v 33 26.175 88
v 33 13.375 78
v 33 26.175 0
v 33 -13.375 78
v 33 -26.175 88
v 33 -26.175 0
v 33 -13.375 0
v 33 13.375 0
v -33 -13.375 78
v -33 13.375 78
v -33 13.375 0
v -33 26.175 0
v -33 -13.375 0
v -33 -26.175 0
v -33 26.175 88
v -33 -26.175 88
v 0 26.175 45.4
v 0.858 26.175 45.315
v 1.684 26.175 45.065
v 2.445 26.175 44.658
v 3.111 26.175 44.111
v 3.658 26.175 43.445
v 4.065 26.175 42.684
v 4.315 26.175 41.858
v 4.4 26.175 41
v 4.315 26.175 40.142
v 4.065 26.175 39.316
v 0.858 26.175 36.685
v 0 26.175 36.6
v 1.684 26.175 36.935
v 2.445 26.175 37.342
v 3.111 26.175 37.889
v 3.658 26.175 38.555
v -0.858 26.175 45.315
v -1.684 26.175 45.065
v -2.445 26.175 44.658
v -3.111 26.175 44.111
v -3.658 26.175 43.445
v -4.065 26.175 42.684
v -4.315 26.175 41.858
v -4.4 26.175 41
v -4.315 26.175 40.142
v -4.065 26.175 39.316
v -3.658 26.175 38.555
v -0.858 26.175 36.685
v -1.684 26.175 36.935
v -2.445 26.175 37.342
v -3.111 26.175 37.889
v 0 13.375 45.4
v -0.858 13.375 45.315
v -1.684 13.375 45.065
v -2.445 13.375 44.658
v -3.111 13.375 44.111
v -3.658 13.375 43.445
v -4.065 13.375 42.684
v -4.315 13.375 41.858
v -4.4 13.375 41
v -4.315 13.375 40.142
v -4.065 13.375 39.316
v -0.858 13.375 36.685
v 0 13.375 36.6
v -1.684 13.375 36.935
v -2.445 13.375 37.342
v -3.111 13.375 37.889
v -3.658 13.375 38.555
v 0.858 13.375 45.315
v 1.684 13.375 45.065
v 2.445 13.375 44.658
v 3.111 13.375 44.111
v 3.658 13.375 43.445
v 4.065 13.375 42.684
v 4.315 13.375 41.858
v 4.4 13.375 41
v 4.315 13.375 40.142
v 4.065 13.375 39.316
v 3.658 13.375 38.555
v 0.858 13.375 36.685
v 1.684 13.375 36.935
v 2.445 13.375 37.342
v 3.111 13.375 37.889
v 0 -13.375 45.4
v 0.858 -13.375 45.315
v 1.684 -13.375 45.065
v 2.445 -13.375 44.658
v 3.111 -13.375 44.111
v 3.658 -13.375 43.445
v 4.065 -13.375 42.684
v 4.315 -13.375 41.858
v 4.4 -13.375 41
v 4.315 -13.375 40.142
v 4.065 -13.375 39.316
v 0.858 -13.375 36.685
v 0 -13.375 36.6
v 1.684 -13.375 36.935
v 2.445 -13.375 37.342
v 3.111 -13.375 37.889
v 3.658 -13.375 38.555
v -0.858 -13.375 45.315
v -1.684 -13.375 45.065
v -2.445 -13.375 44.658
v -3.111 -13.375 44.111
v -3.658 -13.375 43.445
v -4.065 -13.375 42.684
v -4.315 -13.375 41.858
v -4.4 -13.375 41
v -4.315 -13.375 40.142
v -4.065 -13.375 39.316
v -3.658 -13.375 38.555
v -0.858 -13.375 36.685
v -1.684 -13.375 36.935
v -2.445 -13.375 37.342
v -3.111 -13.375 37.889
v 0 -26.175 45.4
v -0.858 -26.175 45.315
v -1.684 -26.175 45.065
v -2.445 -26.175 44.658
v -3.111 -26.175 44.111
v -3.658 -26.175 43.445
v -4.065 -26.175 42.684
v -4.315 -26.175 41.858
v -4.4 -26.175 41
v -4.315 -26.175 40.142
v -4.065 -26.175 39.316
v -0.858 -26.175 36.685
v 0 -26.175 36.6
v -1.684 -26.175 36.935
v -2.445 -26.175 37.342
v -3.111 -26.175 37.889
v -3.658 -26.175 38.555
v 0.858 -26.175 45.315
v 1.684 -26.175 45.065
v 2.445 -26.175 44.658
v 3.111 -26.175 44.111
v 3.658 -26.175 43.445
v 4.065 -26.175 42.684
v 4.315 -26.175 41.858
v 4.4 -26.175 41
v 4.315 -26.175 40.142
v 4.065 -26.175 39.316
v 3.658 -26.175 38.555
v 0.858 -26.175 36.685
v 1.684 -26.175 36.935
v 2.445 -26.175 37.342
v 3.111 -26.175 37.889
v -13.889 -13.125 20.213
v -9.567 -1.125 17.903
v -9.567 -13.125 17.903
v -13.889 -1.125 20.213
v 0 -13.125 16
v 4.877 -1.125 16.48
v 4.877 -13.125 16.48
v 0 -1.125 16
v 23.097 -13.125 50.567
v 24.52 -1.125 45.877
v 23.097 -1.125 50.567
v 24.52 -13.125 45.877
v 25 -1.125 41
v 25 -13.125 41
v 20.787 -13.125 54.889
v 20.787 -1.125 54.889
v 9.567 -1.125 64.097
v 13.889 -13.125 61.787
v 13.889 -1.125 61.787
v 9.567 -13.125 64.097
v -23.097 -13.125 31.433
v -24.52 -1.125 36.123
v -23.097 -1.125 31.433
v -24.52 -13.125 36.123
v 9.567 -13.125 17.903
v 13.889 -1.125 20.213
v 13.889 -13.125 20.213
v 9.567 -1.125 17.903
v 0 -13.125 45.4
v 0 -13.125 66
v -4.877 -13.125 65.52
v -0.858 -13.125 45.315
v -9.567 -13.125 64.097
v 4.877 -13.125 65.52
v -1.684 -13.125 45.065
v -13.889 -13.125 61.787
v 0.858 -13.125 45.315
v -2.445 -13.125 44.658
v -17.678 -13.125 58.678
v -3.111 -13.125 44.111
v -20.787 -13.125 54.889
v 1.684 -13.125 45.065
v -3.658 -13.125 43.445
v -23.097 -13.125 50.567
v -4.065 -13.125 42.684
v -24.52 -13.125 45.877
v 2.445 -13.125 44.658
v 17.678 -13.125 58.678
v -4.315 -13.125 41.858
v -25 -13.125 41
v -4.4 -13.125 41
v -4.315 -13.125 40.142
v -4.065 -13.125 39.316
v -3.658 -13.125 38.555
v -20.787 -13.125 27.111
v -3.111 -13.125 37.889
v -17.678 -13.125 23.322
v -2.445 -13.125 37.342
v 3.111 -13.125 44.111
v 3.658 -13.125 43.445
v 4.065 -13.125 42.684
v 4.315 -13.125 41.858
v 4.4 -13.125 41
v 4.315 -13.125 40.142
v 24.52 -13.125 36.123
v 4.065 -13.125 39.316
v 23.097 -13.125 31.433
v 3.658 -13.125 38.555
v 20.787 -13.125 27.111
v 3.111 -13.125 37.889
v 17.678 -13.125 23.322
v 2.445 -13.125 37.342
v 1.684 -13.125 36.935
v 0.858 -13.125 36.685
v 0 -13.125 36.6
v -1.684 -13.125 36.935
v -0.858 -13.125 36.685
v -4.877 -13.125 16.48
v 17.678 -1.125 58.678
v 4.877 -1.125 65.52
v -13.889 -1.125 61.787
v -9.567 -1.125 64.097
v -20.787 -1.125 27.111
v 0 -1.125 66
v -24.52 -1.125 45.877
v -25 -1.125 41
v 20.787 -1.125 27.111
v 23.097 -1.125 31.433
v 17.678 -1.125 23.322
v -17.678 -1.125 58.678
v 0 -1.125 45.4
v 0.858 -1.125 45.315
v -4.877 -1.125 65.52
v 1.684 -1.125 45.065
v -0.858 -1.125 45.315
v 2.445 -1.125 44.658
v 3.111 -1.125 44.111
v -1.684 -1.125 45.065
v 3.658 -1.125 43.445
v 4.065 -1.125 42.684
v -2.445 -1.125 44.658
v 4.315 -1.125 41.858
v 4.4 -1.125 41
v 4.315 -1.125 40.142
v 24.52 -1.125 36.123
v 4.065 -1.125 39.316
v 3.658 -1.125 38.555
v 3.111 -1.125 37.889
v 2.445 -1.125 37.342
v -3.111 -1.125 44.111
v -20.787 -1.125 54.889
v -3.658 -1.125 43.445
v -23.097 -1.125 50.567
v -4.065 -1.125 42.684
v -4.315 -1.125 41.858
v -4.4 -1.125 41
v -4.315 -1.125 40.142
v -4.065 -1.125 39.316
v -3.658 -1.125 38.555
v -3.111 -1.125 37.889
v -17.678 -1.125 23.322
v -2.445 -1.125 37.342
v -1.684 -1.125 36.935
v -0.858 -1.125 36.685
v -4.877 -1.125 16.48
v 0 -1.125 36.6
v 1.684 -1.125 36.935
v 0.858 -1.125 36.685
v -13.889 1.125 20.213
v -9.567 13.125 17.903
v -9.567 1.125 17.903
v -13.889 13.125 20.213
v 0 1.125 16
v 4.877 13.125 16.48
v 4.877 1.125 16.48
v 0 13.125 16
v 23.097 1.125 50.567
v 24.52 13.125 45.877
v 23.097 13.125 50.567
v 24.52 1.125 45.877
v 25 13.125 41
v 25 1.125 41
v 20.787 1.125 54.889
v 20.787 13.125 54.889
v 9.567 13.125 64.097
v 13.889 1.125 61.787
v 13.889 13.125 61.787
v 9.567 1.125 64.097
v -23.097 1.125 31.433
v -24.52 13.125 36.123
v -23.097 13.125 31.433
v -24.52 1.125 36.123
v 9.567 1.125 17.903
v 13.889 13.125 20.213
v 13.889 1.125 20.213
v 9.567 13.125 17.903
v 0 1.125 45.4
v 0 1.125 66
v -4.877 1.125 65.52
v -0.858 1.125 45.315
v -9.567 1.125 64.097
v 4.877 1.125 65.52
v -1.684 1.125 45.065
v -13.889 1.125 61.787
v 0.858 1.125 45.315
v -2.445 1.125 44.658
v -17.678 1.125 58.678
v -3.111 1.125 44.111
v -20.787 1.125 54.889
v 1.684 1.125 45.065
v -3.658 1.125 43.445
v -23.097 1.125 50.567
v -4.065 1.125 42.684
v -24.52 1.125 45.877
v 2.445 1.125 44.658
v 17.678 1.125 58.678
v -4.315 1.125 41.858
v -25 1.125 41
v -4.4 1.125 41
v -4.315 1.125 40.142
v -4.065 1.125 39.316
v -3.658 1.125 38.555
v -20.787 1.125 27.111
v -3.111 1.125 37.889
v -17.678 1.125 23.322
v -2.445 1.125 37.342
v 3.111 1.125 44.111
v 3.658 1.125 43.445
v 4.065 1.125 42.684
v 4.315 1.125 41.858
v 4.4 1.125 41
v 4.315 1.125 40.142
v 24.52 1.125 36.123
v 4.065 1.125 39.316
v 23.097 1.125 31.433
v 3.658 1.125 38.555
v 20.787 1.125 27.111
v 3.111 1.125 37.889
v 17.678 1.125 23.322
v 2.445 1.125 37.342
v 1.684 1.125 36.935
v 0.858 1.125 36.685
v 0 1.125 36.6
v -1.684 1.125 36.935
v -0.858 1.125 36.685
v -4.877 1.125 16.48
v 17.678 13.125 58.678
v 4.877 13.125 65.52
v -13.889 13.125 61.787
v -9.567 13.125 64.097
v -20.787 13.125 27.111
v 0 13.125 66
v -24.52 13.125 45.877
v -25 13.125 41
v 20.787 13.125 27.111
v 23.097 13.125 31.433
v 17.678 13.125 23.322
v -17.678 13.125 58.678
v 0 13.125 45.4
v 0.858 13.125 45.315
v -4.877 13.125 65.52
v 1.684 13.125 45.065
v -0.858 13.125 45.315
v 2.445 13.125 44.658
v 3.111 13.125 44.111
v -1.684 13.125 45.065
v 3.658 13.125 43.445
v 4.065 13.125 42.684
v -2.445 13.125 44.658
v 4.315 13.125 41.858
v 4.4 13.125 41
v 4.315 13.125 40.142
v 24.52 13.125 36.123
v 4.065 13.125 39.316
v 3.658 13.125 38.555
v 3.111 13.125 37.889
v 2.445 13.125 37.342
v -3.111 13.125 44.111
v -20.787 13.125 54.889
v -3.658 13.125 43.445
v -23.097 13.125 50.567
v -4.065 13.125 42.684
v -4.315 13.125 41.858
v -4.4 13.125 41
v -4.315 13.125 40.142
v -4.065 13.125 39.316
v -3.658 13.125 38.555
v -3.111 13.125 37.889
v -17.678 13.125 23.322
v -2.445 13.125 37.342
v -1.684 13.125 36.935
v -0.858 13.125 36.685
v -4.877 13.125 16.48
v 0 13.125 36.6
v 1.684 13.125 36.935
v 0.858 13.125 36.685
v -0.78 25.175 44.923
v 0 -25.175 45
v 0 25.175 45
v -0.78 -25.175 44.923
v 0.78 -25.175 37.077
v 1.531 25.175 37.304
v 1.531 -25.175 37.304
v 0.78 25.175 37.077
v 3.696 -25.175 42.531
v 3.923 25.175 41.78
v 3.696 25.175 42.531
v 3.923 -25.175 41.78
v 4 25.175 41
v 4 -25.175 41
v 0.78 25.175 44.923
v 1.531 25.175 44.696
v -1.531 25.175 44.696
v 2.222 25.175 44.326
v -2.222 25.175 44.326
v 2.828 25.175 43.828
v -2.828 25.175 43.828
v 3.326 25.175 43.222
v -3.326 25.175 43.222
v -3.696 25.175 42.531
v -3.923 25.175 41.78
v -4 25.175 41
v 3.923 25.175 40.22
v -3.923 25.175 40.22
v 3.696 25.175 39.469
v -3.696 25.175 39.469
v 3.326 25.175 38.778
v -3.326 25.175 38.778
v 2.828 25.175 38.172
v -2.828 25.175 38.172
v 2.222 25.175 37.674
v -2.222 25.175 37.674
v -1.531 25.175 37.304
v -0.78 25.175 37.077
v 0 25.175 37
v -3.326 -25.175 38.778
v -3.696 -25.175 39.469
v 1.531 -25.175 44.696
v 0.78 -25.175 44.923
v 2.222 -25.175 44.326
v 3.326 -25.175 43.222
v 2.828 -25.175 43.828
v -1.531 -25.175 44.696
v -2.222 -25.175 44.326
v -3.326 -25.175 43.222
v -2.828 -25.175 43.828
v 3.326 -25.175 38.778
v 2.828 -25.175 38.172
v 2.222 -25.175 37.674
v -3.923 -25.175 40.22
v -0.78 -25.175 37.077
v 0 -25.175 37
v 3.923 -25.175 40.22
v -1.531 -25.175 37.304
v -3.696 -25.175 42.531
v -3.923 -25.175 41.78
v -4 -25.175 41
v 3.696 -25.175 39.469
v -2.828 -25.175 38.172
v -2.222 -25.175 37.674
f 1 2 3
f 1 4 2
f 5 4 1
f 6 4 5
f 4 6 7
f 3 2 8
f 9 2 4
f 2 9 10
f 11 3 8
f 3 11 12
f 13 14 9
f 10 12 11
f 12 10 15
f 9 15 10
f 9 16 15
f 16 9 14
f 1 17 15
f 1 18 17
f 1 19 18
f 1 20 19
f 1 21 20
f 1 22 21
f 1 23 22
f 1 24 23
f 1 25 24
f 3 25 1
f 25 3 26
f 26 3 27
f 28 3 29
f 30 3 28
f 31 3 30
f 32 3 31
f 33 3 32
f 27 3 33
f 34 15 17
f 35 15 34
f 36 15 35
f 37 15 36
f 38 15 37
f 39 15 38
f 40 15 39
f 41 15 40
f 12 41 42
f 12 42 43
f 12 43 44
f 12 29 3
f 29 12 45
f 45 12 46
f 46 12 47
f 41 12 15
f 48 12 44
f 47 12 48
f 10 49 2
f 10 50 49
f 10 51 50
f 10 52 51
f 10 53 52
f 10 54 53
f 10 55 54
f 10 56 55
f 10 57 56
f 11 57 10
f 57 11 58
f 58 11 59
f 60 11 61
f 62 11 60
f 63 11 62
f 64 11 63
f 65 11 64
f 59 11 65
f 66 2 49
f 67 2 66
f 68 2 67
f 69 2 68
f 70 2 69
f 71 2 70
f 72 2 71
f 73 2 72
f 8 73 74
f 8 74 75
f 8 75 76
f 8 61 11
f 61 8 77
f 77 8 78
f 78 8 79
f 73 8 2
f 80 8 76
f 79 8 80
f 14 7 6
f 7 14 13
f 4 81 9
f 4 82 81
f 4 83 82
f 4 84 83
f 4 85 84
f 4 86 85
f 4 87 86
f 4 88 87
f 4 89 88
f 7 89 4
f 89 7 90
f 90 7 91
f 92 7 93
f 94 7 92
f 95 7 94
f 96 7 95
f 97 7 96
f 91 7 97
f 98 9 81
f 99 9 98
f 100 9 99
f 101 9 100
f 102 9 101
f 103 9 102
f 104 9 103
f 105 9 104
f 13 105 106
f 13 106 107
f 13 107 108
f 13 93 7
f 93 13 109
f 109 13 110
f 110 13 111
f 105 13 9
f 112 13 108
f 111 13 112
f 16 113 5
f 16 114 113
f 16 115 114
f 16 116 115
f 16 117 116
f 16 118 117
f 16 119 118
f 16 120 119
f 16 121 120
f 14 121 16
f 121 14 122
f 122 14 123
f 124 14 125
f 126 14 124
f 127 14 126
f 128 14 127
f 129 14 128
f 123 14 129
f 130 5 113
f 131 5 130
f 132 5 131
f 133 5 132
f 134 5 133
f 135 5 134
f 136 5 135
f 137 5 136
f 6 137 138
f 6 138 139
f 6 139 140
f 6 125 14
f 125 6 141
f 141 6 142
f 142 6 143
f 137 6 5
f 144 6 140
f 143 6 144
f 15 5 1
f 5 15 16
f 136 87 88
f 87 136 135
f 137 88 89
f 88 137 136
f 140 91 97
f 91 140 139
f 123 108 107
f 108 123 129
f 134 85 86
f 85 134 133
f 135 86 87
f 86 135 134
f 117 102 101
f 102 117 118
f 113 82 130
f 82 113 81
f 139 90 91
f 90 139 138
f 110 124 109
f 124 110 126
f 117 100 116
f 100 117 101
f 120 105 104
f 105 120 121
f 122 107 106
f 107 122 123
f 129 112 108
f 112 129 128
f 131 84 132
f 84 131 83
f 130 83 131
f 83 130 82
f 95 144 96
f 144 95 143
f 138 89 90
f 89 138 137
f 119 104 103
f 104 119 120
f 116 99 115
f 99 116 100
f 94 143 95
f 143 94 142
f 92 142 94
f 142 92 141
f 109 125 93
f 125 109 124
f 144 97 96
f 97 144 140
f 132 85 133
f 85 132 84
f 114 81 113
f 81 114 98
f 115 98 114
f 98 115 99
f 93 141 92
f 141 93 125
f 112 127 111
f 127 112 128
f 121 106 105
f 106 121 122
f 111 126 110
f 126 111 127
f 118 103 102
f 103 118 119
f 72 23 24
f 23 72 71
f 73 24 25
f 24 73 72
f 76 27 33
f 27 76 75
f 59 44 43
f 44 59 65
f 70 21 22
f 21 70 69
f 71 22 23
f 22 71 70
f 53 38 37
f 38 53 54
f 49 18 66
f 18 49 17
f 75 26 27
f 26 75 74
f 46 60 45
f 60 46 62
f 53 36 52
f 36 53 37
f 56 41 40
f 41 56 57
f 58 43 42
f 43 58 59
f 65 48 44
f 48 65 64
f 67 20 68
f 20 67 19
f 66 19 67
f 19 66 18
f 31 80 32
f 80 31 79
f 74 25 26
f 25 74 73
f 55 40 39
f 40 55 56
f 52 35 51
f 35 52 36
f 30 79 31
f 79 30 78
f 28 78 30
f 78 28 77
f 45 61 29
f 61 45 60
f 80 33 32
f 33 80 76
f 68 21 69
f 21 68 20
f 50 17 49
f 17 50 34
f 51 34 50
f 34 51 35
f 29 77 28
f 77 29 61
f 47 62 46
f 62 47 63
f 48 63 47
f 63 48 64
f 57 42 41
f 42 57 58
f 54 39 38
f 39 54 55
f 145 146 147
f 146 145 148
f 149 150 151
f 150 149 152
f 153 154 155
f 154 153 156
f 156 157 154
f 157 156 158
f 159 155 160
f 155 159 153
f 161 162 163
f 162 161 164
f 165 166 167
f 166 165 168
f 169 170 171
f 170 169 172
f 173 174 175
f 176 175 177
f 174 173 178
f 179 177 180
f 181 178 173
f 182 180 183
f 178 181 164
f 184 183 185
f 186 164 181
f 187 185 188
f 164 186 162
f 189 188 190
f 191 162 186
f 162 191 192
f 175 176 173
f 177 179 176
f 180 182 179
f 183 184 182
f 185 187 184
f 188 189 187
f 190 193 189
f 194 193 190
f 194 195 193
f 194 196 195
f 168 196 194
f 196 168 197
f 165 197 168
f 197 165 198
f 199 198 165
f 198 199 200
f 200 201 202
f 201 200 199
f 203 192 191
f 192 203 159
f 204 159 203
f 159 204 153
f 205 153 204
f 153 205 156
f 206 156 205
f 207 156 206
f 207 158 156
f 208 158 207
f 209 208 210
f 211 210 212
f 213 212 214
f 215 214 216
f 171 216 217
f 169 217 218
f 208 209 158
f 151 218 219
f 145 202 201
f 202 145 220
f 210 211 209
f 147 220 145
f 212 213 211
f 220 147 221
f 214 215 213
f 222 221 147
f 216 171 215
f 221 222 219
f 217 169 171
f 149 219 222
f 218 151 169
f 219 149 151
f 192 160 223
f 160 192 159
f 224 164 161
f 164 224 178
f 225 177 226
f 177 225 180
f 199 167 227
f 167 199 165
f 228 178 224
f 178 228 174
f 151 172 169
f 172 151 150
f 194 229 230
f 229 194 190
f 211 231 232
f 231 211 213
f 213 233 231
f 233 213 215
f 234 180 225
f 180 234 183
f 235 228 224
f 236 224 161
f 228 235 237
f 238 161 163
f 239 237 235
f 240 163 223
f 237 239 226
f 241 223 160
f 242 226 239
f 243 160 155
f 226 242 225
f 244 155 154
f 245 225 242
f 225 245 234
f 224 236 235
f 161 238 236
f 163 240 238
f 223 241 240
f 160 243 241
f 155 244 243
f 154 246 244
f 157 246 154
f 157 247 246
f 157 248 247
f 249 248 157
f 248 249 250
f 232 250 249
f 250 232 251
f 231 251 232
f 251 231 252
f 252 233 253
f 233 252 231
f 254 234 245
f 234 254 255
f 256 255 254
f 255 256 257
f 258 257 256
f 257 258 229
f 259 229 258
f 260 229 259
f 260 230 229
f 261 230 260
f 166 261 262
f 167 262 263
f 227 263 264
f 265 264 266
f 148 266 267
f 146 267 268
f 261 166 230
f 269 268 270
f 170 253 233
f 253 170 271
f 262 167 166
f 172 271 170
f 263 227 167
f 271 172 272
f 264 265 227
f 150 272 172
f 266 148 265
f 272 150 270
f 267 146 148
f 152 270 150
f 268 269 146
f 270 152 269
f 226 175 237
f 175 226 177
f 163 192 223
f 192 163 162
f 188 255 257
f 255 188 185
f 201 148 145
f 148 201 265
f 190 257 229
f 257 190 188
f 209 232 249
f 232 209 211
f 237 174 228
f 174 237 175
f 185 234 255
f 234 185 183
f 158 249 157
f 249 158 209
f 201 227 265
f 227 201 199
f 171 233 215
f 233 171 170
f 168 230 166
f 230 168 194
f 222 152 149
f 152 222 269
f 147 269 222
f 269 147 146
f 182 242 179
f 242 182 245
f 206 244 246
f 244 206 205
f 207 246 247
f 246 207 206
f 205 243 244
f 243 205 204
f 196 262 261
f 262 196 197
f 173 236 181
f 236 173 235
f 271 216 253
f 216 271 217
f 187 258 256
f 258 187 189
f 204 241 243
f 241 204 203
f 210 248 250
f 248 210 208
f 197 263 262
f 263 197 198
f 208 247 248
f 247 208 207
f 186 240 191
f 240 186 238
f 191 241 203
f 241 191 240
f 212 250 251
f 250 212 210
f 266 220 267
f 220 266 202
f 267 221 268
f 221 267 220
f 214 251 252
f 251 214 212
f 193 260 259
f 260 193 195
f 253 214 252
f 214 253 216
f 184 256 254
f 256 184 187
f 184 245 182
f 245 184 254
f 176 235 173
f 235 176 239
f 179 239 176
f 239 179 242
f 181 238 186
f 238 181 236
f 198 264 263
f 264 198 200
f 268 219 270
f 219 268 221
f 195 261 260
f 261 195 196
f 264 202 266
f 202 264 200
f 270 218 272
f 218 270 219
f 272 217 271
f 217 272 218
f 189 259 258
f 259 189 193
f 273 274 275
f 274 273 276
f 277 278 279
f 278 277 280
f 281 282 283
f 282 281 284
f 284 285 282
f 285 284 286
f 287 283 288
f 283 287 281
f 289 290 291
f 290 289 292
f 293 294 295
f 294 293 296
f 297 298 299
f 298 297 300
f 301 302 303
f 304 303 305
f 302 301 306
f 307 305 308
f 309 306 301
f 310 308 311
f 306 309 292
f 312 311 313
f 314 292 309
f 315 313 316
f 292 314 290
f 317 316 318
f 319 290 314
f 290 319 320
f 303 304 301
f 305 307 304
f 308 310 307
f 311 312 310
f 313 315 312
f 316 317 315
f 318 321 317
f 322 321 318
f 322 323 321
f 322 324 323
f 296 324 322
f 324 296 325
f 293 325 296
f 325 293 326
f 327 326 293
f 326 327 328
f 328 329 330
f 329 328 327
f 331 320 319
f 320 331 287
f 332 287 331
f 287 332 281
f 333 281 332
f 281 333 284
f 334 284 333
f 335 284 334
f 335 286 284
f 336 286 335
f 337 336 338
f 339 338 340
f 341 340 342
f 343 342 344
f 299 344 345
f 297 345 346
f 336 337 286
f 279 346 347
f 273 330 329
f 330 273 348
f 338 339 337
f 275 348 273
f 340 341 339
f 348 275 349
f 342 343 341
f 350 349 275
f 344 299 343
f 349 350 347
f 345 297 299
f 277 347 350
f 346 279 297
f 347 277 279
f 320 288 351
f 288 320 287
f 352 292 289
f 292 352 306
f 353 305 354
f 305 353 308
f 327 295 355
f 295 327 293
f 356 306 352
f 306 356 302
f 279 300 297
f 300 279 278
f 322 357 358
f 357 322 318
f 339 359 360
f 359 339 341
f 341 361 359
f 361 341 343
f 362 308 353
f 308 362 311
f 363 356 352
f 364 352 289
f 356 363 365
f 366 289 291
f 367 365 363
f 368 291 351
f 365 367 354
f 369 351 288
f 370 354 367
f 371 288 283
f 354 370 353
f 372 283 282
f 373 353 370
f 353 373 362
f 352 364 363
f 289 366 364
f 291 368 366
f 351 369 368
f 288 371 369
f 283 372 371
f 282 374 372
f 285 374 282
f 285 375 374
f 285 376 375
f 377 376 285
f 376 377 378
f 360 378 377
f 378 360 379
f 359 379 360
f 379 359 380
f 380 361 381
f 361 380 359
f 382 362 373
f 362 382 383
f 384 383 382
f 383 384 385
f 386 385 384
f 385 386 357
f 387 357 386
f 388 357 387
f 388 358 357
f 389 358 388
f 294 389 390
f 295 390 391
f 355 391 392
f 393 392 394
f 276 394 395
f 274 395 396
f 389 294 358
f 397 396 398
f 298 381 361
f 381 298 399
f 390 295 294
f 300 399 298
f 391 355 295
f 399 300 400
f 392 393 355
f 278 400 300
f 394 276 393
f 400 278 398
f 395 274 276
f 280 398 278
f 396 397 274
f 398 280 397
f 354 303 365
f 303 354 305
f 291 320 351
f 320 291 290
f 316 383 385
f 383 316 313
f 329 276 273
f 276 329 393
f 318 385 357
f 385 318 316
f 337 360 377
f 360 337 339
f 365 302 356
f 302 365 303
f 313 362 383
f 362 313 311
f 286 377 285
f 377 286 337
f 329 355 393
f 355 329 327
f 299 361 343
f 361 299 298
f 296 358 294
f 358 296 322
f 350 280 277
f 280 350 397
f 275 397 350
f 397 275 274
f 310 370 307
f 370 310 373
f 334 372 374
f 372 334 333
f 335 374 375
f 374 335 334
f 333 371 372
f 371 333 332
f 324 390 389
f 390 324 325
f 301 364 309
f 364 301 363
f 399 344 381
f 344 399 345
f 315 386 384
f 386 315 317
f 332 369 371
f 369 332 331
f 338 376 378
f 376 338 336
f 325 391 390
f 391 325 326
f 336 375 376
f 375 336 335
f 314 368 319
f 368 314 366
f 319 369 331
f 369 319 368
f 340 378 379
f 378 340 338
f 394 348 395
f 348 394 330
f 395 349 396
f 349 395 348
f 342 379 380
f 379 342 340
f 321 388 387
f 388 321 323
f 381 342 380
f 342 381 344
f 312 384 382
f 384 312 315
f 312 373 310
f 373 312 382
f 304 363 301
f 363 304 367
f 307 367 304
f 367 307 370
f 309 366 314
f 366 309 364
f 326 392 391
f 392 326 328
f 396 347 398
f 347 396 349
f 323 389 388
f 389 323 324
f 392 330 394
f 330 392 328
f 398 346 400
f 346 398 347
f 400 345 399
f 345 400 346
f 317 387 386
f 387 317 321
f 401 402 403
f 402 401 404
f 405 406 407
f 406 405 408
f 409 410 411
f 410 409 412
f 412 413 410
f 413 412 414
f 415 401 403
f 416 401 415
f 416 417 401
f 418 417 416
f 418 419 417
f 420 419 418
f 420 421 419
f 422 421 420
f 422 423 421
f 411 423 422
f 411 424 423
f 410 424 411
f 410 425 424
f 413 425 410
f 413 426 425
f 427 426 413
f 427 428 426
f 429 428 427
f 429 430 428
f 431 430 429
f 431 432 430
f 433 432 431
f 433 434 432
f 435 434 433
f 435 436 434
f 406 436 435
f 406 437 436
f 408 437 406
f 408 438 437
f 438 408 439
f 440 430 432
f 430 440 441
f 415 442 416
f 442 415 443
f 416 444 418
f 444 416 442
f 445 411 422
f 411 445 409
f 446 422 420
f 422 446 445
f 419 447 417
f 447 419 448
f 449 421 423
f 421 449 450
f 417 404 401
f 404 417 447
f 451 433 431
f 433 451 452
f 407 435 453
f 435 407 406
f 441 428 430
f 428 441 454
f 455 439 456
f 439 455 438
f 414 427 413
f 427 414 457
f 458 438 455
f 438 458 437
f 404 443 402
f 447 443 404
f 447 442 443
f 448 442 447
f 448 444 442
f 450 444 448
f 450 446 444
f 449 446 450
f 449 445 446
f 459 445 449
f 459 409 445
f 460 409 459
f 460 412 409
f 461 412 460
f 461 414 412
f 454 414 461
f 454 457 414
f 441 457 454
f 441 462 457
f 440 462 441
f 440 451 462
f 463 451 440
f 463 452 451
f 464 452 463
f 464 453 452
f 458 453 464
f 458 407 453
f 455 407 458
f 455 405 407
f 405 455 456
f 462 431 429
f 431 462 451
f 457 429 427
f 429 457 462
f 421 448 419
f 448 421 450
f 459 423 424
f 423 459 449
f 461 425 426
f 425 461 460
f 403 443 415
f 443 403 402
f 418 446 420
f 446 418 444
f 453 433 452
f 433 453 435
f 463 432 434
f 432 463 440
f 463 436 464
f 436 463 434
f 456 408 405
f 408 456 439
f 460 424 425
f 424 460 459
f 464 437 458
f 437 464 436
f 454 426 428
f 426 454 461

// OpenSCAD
$fn = 32;

// ------------------------------------------------------------------------
// Trolley wheel set: wheels d50, fork 78 mm tall
// Every part is its own module, assembly() places every instance.
// ------------------------------------------------------------------------

// --- part 1 ---
module trolley_fork() {
  difference() {
    union() {
      translate([-33, 13.375, 0]) cube([66, 12.8, 78]);
      translate([-33, -26.175, 0]) cube([66, 12.8, 78]);
      translate([-33, -26.175, 78]) cube([66, 52.35, 10]);
    }
    translate([0, -19.775, 41]) rotate([90, 0, 0]) cylinder(h = 14.8, d = 8.8, center = true);
    translate([0, 19.775, 41]) rotate([90, 0, 0]) cylinder(h = 14.8, d = 8.8, center = true);
  }
}

// --- part 2 ---
module trolley_wheel() {
  difference() {
      translate([0, 0, 0]) cylinder(h = 12, d = 50);
      translate([0, 0, -1]) cylinder(h = 14, d = 8.8);
    }
}

// --- part 3 ---
module trolley_axle() {
  translate([0, 0, -25.175]) cylinder(h = 50.35, d = 8);
}

// --- assembly ---
module assembly() {
  color([0.80, 0.24, 0.20]) translate([0, 0, 0]) rotate([0, 0, 0]) trolley_fork();
  color([0.20, 0.45, 0.75]) translate([0, -1.125, 41]) rotate([90, 0, 0]) trolley_wheel();
  color([0.25, 0.62, 0.32]) translate([0, 13.125, 41]) rotate([90, 0, 0]) trolley_wheel();
  color([0.92, 0.70, 0.18]) translate([0, 0, 41]) rotate([90, 0, 0]) trolley_axle();
}

assembly();
